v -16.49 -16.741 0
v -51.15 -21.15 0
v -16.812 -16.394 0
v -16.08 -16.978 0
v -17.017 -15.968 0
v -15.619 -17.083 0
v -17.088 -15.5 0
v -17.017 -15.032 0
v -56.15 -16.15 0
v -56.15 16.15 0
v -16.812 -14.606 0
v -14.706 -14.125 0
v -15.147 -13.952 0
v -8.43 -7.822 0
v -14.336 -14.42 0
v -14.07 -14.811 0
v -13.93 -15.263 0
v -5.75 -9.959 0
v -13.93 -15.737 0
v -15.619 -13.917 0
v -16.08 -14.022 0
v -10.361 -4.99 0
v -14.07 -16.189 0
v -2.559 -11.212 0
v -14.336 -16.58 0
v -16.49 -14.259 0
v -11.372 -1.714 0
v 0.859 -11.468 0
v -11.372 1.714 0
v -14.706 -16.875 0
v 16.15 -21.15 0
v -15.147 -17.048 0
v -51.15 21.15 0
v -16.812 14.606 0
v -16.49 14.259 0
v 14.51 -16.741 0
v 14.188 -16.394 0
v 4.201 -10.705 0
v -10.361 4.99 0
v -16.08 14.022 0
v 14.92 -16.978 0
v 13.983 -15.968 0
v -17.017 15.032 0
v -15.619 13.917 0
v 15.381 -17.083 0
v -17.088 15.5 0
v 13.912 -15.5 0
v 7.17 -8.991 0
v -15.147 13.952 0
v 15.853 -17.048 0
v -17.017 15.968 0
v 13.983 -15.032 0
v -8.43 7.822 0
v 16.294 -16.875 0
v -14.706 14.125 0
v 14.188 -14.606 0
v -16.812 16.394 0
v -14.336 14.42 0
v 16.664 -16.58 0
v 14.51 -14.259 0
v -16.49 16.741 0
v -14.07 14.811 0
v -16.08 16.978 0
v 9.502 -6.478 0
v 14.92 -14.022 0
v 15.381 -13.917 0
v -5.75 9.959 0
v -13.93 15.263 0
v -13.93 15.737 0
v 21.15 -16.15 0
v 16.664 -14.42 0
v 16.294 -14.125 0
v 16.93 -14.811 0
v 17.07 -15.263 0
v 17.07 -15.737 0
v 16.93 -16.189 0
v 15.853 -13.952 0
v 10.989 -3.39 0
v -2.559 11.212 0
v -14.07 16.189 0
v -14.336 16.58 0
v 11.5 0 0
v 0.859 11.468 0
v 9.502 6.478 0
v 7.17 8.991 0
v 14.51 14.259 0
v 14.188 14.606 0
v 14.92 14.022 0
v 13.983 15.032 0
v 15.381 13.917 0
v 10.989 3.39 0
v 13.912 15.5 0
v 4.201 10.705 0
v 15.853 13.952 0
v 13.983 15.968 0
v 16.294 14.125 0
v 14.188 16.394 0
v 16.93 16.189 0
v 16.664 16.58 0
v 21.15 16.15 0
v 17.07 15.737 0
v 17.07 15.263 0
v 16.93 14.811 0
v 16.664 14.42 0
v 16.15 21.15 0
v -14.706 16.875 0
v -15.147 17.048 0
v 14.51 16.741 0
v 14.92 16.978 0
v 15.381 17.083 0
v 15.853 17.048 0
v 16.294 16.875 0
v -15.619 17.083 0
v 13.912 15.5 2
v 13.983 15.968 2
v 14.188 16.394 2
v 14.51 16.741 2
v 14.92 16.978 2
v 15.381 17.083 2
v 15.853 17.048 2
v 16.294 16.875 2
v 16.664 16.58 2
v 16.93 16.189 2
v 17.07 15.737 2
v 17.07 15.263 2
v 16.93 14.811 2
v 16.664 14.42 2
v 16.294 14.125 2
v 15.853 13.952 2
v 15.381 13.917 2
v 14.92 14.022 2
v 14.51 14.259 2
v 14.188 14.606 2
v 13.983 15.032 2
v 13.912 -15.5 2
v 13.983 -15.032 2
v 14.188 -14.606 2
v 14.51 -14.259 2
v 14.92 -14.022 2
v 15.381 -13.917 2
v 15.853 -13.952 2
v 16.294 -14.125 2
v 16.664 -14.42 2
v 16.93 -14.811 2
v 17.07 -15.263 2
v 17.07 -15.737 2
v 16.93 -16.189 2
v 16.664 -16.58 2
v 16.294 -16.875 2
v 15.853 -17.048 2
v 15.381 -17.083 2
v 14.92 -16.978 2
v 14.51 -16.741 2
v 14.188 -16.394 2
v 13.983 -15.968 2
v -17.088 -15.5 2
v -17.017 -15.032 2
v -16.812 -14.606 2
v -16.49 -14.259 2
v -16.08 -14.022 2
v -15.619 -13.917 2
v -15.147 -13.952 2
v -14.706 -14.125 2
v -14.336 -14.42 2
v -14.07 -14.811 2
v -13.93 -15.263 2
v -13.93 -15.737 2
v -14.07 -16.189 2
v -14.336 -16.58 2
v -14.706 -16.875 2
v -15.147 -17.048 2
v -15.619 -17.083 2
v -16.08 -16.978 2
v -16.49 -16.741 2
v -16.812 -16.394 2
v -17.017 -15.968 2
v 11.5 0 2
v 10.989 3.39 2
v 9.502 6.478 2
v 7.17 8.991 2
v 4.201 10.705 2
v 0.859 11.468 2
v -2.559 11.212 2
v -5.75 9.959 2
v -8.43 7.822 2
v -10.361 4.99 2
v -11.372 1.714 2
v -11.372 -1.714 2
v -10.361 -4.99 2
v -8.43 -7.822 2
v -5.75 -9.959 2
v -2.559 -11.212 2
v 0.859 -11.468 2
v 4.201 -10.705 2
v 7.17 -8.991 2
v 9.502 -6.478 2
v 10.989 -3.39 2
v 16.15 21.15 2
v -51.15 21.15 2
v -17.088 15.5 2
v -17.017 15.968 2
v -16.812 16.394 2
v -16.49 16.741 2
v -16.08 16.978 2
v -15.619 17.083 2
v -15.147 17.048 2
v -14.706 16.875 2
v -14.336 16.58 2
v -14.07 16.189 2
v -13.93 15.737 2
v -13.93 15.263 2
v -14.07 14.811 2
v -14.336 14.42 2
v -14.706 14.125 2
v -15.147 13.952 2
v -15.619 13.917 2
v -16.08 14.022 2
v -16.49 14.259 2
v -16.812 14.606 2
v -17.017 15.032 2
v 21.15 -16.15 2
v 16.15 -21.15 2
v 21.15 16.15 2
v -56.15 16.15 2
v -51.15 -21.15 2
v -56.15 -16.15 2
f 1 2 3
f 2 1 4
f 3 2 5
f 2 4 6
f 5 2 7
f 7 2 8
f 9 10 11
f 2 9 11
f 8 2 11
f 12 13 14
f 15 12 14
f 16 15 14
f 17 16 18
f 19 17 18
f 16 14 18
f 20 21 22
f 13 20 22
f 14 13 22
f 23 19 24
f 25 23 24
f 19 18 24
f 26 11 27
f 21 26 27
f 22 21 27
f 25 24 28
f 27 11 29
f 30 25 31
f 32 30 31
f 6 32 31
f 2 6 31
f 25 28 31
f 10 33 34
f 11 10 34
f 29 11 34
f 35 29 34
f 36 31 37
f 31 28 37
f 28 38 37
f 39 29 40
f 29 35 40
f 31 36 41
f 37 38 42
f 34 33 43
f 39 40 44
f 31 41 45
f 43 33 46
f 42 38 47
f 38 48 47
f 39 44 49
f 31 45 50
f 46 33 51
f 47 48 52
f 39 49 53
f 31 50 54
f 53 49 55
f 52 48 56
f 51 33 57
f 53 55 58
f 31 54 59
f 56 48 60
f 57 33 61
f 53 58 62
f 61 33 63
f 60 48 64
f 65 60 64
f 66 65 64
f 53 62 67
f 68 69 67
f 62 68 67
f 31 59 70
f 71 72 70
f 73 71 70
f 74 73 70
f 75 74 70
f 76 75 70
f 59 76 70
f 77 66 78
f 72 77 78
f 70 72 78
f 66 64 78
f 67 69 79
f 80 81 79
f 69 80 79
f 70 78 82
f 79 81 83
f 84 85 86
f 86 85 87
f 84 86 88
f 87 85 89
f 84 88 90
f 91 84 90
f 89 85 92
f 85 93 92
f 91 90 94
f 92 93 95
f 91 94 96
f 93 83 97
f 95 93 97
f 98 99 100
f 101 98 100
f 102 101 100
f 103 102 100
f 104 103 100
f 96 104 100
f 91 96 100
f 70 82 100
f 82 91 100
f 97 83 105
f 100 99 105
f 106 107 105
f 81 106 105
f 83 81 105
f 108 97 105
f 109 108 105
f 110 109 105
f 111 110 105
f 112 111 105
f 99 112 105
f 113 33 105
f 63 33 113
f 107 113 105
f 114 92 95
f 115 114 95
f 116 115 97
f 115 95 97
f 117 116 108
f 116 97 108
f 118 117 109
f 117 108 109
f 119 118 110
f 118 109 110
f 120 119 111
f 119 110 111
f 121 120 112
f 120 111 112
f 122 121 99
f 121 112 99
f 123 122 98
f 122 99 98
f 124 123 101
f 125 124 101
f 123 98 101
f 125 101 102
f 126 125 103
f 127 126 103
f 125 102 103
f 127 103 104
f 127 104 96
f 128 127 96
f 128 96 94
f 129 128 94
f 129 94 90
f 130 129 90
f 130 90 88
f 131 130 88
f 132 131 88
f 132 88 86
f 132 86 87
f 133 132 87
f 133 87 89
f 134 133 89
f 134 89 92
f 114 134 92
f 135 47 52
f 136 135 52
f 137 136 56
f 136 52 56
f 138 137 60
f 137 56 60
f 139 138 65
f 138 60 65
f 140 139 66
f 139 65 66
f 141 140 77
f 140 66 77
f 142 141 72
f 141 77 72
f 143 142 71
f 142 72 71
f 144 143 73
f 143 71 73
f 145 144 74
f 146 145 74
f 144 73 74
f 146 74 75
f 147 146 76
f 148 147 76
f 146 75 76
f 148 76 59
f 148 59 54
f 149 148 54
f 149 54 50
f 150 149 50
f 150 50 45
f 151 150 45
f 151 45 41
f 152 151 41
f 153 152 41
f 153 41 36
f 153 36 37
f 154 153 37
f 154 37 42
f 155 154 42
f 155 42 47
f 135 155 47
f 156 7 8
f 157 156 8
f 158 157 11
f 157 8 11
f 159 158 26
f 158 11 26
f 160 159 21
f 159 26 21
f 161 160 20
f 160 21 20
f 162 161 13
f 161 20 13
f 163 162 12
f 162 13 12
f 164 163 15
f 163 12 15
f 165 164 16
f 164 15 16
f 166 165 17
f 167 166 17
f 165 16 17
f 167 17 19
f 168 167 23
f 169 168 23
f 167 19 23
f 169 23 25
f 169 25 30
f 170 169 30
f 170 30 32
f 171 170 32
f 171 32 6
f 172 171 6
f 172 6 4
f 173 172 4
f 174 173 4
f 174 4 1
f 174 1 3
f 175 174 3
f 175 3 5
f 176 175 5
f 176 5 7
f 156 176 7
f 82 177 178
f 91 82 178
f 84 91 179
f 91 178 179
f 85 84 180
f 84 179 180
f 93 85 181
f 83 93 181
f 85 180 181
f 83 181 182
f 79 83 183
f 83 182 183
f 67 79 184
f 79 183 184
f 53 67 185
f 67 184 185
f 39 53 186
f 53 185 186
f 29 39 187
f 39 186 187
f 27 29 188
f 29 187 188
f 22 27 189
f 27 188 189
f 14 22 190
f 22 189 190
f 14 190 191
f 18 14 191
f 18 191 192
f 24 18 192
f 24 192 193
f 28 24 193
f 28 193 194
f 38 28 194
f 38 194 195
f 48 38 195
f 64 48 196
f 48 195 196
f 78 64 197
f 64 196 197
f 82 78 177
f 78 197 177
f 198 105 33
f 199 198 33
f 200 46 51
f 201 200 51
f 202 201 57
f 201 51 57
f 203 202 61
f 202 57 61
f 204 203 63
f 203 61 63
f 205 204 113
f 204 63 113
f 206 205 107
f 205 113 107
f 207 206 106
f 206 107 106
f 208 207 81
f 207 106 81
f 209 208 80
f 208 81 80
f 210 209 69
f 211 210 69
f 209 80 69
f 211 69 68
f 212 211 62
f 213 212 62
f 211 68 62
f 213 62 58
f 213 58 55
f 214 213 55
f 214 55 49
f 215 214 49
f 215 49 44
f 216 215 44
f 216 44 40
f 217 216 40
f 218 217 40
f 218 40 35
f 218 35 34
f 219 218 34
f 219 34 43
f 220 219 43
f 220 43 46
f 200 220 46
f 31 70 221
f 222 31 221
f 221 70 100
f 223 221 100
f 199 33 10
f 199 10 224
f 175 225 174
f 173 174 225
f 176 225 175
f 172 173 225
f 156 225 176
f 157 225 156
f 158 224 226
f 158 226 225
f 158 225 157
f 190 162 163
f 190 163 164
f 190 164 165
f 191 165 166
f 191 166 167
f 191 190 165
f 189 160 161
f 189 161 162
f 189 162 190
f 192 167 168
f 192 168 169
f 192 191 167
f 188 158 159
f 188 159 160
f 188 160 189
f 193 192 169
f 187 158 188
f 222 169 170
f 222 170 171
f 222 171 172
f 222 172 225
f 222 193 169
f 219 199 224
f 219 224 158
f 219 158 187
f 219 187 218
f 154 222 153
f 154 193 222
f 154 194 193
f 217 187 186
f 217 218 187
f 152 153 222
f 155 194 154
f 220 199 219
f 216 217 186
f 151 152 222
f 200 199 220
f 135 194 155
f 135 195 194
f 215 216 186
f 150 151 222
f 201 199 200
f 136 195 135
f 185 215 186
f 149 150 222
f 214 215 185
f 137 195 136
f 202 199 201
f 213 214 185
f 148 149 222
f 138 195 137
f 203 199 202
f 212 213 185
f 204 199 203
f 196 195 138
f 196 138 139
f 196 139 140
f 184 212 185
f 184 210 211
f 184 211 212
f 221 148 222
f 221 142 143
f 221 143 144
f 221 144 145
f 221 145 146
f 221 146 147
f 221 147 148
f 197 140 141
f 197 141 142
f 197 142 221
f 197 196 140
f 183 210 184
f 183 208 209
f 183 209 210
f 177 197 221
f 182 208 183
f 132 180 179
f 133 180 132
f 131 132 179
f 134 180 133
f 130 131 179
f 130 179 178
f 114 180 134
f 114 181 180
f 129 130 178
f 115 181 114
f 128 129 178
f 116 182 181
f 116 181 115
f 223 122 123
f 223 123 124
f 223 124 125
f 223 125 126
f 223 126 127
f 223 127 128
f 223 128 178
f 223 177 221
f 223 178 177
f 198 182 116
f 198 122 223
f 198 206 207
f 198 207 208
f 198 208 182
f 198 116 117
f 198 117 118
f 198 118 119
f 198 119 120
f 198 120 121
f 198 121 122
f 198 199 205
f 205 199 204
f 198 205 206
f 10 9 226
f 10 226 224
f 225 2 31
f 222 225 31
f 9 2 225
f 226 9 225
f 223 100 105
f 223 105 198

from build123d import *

# Parameters (mm, degrees)
SKETCH1_W                        = 35
SKETCH1_H                        = 42.3
SKETCH1_W_2                      = 42.3
BOSS_EXTRUDE1_DEPTH              = 2
F_1_8_0_125_DIAMETER_HOLE1_D     = 3.175
F_1_8_0_125_DIAMETER_HOLE1_DEPTH = 4.5
F_1_8_0_125_DIAMETER_HOLE1_TIP   = 0.953866233
SKETCH4_R                        = 11.5
CUT_EXTRUDE1_DEPTH               = 2
CHAMFER1_SIZE                    = 5


with BuildPart() as part:
    # Sketch1 → Boss-Extrude1 (new body)
    with BuildSketch(Plane.XY):
        with Locations((-38.65, 0)):
            Rectangle(SKETCH1_W, SKETCH1_H)
        Rectangle(SKETCH1_W_2, SKETCH1_H)
    extrude(amount=BOSS_EXTRUDE1_DEPTH)

    # 1/8 (0.125) Diameter Hole1
    with Locations(Plane.XY.offset(2)):
        with Locations((-15.5, 15.5), (15.5, 15.5), (15.5, -15.5), (-15.5, -15.5)):
            Hole(F_1_8_0_125_DIAMETER_HOLE1_D / 2, depth=F_1_8_0_125_DIAMETER_HOLE1_DEPTH)
            with Locations((0, 0, -(F_1_8_0_125_DIAMETER_HOLE1_DEPTH + F_1_8_0_125_DIAMETER_HOLE1_TIP / 2))):  # 118° drill point
                Cone(0, F_1_8_0_125_DIAMETER_HOLE1_D / 2, F_1_8_0_125_DIAMETER_HOLE1_TIP, mode=Mode.SUBTRACT)

    # Sketch4 → Cut-Extrude1 (cut)
    with BuildSketch(Plane.XY.offset(2)):
        Circle(SKETCH4_R)
    extrude(amount=-CUT_EXTRUDE1_DEPTH, mode=Mode.SUBTRACT)

    # Chamfer1
    chamfer1_edges = [part.edges().sort_by_distance(p)[0] for p in [
        (21.15, 21.15, 1),
        (21.15, -21.15, 1),
        (-56.15, -21.15, 1),
        (-56.15, 21.15, 1),
    ]]
    chamfer(chamfer1_edges, length=CHAMFER1_SIZE)


solid = part.part
